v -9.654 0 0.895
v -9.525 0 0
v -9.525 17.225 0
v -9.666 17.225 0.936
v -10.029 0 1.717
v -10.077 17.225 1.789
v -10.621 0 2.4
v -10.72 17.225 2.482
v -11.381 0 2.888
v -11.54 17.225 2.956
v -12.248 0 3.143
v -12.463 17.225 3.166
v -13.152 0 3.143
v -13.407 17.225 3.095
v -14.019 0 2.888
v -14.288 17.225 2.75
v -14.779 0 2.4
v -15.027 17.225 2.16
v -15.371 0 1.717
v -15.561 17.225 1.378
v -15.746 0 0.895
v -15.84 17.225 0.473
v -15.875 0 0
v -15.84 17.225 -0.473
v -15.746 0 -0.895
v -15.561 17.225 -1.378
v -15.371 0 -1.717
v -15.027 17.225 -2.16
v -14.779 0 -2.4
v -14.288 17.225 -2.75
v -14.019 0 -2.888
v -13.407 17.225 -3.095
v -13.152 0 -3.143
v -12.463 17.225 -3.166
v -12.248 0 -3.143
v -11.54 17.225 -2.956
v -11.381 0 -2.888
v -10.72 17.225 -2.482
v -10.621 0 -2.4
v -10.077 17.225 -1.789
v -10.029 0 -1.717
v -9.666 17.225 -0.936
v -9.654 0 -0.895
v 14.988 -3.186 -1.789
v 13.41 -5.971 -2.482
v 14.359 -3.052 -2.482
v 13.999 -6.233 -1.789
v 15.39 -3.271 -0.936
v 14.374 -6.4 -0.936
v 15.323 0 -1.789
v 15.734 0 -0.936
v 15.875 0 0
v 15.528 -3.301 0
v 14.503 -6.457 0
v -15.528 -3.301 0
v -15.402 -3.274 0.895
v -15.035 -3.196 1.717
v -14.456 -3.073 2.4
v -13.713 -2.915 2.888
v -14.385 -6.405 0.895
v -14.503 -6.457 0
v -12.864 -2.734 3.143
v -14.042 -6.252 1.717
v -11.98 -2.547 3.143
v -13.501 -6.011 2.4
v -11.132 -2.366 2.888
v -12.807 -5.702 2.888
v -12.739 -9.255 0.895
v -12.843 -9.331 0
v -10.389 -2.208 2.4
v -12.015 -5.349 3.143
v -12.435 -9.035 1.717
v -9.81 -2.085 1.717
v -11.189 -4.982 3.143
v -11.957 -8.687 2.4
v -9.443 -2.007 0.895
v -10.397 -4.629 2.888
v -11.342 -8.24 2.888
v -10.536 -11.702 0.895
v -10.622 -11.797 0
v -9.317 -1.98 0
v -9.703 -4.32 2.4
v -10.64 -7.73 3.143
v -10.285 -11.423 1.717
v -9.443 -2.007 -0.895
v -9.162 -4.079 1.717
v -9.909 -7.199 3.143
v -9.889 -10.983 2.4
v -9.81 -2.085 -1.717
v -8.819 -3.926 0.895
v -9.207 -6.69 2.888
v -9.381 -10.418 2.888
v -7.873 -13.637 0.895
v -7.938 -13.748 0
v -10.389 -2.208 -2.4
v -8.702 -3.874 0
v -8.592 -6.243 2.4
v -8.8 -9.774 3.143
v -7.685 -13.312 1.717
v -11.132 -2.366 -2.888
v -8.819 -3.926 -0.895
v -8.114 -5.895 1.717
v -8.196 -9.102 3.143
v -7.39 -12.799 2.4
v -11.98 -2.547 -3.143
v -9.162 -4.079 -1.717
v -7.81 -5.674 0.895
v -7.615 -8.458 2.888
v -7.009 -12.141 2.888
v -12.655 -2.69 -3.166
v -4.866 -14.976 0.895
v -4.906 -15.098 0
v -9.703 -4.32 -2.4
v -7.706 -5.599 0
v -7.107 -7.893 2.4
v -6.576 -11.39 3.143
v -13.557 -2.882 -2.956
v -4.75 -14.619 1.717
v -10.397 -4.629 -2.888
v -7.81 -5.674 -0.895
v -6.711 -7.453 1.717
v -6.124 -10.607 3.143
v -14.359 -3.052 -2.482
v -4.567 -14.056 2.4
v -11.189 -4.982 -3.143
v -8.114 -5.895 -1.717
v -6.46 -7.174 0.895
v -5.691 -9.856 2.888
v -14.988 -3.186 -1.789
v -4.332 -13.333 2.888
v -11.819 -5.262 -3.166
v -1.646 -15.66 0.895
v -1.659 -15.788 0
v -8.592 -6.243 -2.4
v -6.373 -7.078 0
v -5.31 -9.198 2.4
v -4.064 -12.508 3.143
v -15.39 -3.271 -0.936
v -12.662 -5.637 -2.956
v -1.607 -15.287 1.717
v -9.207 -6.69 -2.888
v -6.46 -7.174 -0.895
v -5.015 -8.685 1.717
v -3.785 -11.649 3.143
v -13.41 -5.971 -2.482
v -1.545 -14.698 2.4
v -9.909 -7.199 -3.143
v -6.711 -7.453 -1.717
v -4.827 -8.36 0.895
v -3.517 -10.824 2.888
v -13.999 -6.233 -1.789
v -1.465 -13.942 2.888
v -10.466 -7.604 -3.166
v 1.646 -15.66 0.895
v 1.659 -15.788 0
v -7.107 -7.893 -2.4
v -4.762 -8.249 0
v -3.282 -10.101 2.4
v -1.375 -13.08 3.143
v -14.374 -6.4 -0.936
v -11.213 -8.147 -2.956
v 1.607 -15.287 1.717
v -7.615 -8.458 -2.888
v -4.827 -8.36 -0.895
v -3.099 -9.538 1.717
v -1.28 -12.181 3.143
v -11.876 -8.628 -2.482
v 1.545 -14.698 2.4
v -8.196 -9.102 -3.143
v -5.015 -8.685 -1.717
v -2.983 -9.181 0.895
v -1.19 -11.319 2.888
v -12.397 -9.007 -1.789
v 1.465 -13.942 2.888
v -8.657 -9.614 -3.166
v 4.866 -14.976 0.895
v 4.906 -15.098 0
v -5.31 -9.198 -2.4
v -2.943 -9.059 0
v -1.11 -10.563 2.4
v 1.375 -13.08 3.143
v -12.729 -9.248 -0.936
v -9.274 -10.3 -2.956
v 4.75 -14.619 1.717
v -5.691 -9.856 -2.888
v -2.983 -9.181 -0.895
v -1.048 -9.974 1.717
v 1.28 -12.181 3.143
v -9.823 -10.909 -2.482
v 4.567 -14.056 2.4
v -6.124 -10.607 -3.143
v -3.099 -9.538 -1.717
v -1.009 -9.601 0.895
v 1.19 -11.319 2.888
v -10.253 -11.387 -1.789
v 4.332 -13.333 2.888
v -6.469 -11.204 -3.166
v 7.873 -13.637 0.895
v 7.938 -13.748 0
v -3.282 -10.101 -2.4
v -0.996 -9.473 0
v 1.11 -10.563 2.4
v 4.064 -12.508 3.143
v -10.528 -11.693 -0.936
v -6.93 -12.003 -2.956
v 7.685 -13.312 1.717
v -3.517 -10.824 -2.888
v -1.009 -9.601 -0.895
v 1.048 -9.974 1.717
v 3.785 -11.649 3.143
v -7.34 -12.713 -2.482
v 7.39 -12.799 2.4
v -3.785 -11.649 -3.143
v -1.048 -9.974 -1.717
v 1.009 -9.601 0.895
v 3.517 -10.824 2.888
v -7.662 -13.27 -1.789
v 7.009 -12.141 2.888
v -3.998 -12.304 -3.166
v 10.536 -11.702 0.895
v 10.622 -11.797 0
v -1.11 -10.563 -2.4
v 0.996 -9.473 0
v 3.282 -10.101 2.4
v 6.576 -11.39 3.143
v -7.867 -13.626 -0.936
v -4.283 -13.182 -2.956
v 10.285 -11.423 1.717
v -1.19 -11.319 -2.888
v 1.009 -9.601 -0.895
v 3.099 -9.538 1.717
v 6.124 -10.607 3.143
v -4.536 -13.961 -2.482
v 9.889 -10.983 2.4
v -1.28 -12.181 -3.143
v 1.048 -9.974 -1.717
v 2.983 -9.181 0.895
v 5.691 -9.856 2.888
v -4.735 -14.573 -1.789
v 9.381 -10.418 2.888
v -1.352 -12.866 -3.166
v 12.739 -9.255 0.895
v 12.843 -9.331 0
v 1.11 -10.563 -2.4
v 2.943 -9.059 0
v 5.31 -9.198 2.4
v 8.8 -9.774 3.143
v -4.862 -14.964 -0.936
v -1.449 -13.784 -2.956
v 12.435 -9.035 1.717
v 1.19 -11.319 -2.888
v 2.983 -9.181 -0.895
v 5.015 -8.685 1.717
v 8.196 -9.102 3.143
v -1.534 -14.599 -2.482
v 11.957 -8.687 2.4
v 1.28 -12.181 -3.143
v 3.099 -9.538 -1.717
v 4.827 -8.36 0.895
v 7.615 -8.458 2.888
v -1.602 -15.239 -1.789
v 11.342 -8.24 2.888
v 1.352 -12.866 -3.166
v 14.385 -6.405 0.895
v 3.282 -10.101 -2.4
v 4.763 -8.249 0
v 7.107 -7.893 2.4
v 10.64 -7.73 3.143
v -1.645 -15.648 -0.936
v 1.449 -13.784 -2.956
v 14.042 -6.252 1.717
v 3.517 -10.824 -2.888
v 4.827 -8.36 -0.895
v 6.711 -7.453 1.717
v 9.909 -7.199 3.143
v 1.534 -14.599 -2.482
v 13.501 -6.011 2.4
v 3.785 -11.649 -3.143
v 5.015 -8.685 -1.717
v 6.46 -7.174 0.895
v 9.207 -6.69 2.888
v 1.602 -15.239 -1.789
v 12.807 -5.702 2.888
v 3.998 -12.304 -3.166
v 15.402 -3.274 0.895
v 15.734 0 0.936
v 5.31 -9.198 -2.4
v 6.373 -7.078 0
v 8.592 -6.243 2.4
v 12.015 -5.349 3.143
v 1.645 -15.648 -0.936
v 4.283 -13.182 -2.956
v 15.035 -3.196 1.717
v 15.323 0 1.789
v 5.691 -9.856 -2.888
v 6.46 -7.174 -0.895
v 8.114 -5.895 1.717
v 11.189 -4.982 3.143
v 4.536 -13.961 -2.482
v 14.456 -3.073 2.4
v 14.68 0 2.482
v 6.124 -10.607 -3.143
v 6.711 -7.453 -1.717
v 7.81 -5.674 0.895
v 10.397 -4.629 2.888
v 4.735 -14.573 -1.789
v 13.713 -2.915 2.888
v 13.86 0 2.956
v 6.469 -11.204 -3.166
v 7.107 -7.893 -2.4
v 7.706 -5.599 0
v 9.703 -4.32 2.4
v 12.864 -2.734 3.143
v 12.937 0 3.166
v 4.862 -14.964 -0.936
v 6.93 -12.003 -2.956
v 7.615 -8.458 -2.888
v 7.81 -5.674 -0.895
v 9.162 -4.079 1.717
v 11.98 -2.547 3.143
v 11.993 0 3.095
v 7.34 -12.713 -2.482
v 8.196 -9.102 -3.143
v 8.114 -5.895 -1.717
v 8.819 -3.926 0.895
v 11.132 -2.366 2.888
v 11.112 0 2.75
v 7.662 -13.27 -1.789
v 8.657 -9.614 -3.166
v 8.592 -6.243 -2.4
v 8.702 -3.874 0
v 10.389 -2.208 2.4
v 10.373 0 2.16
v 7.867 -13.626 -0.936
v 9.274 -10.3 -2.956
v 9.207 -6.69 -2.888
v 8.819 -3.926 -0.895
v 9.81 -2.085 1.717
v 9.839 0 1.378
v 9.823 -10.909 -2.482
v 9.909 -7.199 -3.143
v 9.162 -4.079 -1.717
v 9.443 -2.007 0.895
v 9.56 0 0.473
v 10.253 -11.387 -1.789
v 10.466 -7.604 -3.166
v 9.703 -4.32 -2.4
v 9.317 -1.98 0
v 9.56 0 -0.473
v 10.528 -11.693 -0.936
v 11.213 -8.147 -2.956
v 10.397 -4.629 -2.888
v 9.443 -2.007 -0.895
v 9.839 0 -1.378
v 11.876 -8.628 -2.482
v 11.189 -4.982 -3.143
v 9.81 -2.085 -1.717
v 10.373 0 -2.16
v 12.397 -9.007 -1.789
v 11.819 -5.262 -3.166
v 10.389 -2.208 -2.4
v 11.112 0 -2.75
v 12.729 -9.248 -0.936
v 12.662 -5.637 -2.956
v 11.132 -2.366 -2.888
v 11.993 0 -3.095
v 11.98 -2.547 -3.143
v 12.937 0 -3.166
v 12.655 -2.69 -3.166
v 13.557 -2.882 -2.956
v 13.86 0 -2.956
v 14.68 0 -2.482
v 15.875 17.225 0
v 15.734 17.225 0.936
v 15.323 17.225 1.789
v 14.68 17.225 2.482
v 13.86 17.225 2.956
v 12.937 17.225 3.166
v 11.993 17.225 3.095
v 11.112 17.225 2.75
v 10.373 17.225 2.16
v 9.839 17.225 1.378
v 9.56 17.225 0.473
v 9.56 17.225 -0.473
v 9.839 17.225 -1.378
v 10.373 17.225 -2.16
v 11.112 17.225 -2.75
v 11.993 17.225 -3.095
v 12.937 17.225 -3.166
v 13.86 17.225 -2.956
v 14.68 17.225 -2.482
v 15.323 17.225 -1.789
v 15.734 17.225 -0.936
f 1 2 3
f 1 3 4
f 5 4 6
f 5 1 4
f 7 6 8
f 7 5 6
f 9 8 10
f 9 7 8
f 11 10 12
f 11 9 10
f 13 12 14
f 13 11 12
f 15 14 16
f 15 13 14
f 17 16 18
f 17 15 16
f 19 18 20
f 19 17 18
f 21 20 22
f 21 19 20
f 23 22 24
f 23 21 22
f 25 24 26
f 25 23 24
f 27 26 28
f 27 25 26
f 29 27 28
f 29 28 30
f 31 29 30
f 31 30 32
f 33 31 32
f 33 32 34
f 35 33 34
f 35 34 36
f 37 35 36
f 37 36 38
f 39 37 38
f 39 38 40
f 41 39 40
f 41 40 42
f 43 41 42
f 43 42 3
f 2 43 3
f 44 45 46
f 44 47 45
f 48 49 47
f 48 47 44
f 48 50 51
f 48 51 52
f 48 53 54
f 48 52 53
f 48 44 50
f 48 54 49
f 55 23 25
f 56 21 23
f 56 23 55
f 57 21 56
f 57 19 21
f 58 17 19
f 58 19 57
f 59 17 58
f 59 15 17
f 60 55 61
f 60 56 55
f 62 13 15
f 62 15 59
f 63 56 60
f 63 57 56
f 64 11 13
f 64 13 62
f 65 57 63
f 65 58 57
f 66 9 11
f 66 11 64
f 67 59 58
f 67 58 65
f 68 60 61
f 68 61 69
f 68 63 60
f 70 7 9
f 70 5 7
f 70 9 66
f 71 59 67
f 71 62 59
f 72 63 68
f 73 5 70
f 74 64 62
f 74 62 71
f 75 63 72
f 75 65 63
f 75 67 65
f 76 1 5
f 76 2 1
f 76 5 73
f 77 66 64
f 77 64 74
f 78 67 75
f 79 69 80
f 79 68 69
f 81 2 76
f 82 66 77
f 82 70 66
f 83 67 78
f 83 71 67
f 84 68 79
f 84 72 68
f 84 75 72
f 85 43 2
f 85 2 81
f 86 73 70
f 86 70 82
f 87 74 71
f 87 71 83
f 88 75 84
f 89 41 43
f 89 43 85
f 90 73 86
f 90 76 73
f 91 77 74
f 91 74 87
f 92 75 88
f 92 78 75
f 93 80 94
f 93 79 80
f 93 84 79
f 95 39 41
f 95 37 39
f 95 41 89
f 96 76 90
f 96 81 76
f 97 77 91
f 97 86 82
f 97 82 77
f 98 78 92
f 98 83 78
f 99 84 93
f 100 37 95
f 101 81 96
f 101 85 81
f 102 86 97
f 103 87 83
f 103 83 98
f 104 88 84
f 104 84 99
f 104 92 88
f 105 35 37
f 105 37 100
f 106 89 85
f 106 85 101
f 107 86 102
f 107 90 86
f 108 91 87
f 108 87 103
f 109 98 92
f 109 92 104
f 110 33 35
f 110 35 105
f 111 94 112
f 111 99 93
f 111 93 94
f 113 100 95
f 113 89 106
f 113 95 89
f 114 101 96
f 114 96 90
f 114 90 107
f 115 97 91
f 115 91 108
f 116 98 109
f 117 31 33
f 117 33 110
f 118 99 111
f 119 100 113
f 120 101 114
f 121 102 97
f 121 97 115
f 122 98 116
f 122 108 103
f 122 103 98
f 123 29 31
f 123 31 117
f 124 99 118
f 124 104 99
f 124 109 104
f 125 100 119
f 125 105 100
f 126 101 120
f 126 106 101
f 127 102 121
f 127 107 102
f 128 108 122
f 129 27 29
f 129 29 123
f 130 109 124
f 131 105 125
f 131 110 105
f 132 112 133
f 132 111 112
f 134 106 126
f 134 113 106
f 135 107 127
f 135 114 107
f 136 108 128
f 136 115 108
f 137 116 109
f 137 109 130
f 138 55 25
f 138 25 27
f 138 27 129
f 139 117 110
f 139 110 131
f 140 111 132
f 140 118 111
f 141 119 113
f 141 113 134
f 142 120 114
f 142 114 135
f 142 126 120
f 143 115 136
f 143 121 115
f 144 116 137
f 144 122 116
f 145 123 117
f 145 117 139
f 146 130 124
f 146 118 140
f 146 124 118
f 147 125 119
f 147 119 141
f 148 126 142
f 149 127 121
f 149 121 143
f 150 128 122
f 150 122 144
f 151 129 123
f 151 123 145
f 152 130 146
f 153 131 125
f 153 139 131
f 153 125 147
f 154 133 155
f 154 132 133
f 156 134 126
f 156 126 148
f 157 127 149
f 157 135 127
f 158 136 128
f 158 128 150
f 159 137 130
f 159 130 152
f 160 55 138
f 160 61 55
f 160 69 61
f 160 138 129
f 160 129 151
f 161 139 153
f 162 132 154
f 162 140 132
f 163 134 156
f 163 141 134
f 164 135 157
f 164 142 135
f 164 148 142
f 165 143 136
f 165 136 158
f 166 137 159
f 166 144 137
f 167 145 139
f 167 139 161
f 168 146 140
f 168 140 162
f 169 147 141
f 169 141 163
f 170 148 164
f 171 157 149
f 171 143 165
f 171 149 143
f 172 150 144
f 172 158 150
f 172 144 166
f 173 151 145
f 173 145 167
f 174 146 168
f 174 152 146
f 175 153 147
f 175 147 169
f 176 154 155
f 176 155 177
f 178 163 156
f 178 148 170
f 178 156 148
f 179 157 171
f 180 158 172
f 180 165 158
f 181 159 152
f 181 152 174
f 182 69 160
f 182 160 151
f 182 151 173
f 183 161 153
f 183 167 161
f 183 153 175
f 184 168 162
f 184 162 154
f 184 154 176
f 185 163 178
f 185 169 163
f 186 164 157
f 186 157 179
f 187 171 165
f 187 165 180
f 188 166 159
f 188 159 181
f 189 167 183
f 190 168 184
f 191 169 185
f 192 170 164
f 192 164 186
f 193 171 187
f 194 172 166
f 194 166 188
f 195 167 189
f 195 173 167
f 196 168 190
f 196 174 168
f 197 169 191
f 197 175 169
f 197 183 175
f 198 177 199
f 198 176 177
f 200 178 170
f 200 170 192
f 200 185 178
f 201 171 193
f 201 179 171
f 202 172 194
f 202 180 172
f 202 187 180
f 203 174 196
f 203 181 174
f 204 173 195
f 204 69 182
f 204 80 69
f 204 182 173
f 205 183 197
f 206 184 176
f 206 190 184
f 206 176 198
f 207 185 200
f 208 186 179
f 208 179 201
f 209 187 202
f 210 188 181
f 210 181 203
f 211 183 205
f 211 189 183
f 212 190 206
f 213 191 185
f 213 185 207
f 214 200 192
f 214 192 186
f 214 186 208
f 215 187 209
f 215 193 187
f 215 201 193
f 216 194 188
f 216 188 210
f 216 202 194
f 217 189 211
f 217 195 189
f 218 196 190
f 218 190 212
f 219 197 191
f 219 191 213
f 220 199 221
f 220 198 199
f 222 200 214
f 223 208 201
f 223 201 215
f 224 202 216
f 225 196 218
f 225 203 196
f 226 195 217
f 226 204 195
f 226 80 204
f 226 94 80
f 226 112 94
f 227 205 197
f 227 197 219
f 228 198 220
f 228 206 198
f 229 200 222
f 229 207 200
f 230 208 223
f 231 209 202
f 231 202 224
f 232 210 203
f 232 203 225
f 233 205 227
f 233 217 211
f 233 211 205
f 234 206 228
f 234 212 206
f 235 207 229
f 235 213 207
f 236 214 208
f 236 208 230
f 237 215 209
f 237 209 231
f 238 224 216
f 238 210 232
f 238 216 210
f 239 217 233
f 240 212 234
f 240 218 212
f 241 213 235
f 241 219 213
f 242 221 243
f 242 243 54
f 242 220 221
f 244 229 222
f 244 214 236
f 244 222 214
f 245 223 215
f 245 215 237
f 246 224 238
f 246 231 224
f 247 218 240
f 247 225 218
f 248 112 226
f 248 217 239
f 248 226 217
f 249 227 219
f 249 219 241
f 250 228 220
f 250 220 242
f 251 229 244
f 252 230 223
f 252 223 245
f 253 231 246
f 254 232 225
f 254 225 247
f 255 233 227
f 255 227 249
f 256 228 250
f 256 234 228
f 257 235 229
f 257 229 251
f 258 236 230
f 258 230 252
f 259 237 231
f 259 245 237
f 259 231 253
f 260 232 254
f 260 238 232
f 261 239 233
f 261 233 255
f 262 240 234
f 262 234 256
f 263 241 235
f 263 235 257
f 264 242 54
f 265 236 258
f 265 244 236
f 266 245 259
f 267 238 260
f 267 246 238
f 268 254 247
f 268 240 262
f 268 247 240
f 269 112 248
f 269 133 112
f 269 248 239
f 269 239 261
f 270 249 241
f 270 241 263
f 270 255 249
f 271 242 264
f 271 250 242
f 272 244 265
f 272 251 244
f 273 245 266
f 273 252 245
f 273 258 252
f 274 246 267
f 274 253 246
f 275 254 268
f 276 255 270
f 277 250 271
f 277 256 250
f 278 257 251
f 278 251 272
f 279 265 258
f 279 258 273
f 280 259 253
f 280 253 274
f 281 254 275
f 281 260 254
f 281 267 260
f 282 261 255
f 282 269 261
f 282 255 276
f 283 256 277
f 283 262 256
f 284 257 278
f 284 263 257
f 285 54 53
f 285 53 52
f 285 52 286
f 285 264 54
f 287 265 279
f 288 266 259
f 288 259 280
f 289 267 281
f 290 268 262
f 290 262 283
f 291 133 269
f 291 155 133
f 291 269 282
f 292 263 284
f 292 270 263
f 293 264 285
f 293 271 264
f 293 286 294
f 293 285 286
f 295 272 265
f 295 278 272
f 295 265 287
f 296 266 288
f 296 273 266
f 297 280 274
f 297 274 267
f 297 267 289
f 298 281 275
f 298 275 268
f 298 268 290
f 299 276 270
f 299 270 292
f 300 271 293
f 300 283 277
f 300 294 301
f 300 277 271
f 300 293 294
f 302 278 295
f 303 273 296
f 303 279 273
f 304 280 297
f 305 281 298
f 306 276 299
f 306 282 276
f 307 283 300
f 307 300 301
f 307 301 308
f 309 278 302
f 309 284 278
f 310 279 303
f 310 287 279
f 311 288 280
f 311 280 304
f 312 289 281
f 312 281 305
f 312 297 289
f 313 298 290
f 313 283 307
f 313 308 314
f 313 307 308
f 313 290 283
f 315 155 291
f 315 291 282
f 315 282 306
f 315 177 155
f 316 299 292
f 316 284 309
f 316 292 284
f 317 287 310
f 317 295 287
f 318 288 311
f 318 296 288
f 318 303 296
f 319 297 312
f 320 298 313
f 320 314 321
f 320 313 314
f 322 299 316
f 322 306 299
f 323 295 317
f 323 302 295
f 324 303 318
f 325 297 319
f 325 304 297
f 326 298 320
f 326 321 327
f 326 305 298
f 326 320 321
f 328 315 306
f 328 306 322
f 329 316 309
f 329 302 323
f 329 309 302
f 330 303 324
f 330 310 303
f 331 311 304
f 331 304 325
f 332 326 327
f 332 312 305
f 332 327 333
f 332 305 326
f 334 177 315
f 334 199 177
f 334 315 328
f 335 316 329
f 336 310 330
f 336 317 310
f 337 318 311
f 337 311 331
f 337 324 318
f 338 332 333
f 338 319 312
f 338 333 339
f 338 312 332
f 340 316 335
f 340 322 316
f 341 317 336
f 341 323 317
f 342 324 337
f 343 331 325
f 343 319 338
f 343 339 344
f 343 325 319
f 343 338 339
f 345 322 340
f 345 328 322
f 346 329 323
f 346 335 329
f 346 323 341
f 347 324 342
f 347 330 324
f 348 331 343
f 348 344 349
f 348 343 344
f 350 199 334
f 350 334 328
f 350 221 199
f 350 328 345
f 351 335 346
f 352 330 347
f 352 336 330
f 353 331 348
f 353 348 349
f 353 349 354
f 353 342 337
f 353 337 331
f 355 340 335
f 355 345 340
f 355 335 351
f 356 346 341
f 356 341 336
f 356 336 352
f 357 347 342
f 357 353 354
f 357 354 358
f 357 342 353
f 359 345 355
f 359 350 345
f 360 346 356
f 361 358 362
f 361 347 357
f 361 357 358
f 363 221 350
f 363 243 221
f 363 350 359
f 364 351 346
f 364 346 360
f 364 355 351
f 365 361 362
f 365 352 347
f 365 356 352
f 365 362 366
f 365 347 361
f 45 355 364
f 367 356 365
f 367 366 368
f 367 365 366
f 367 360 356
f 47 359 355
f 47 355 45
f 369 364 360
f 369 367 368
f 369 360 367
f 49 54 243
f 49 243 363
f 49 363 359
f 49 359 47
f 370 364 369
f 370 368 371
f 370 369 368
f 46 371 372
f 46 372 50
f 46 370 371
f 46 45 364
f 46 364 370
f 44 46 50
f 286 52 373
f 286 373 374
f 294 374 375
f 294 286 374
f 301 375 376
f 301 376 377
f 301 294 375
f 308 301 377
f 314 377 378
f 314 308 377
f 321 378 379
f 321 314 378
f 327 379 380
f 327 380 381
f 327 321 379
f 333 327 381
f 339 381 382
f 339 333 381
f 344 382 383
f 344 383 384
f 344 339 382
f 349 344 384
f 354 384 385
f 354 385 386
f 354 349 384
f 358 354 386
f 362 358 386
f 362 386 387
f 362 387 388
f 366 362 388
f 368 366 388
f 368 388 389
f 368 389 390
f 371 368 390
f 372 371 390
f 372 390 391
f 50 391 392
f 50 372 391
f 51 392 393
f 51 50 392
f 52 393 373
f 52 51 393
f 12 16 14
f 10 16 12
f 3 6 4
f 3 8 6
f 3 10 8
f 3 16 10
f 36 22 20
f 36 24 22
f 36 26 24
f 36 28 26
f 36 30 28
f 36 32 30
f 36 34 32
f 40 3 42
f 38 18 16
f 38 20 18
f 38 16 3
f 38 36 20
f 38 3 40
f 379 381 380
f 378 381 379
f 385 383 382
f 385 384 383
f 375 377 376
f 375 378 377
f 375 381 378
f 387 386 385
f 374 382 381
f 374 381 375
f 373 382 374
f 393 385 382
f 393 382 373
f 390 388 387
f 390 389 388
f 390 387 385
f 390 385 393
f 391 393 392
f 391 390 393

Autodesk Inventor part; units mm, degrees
ref_plane "YZ Plane" through (0, 0, 0) normal (1, 0, 0) x (0, 1, 0)
ref_plane "XZ Plane" through (0, 0, 0) normal (0, 1, 0) x (-1, 0, 0)
ref_plane "XY Plane" through (0, 0, 0) normal (0, 0, 1) x (1, 0, 0)
sketch "Sketch1" plane through (0, 0, 0) normal (0, 1, 0) x (-1, 0, 0)
  circle A0 centre (12.7, 0) radius 3.175
  line L0 (0, -4.445) -> (0, 4.445) projected
  point P0 (0, 0)
  dimension "d0" = 12.7
  dimension "d1" = 6.35
revolve "Revolution1" add sketch "Sketch1" angle 180 about axis through (0, 0, -10) along (0, 0, 1)
sketch "Sketch2" plane through (-12.7, 0, 0) normal (0, 1, 0) x (1, 0, 0)
  circle A0 centre (0, 0) radius 3.175 projected
  circle A1 centre (25.4, 0) radius 3.175 projected
  point P0 (12.7, 0)
extrude "Extrusion1" add sketch "Sketch2" along normal blind 6.35
sketch "Sketch3" plane through (-12.7, 6.35, 0) normal (0, 1, 0) x (1, 0, 0)
  circle A0 centre (0, 0) radius 3.175 projected
  circle A1 centre (25.4, 0) radius 3.175 projected
  point P0 (12.7, 0)
extrude "Extrusion2" add sketch "Sketch3" along normal blind 15.875
thread "Thread1" size "1/4-20 UNC" class "2A" standard "ANSI Unified Screw Threads" length 15.875
thread "Thread2" size "1/4-20 UNC" class "2A" standard "ANSI Unified Screw Threads" length 15.875
sketch "Sketch4" plane through (-12.7, 22.225, 0) normal (0, 1, 0) x (1, 0, 0)
  line L0 (-3.2033, 0) -> (28.6033, 0) construction
  line L1 (-3.2033, -3.175) -> (28.6033, -3.175)
  line L2 (28.6033, 3.175) -> (-3.2033, 3.175)
  arc A0 (-3.2033, 3.175) -> (-3.2033, -3.175) centre (-3.2033, 0) ccw
  arc A1 (28.6033, -3.175) -> (28.6033, 3.175) centre (28.6033, 0) ccw
  point P0 (12.7, 0)
extrude "Extrusion3" cut sketch "Sketch4" against normal blind 5
properties part number "19mm ID UBOLT" material "Stainless Steel, 440C"
